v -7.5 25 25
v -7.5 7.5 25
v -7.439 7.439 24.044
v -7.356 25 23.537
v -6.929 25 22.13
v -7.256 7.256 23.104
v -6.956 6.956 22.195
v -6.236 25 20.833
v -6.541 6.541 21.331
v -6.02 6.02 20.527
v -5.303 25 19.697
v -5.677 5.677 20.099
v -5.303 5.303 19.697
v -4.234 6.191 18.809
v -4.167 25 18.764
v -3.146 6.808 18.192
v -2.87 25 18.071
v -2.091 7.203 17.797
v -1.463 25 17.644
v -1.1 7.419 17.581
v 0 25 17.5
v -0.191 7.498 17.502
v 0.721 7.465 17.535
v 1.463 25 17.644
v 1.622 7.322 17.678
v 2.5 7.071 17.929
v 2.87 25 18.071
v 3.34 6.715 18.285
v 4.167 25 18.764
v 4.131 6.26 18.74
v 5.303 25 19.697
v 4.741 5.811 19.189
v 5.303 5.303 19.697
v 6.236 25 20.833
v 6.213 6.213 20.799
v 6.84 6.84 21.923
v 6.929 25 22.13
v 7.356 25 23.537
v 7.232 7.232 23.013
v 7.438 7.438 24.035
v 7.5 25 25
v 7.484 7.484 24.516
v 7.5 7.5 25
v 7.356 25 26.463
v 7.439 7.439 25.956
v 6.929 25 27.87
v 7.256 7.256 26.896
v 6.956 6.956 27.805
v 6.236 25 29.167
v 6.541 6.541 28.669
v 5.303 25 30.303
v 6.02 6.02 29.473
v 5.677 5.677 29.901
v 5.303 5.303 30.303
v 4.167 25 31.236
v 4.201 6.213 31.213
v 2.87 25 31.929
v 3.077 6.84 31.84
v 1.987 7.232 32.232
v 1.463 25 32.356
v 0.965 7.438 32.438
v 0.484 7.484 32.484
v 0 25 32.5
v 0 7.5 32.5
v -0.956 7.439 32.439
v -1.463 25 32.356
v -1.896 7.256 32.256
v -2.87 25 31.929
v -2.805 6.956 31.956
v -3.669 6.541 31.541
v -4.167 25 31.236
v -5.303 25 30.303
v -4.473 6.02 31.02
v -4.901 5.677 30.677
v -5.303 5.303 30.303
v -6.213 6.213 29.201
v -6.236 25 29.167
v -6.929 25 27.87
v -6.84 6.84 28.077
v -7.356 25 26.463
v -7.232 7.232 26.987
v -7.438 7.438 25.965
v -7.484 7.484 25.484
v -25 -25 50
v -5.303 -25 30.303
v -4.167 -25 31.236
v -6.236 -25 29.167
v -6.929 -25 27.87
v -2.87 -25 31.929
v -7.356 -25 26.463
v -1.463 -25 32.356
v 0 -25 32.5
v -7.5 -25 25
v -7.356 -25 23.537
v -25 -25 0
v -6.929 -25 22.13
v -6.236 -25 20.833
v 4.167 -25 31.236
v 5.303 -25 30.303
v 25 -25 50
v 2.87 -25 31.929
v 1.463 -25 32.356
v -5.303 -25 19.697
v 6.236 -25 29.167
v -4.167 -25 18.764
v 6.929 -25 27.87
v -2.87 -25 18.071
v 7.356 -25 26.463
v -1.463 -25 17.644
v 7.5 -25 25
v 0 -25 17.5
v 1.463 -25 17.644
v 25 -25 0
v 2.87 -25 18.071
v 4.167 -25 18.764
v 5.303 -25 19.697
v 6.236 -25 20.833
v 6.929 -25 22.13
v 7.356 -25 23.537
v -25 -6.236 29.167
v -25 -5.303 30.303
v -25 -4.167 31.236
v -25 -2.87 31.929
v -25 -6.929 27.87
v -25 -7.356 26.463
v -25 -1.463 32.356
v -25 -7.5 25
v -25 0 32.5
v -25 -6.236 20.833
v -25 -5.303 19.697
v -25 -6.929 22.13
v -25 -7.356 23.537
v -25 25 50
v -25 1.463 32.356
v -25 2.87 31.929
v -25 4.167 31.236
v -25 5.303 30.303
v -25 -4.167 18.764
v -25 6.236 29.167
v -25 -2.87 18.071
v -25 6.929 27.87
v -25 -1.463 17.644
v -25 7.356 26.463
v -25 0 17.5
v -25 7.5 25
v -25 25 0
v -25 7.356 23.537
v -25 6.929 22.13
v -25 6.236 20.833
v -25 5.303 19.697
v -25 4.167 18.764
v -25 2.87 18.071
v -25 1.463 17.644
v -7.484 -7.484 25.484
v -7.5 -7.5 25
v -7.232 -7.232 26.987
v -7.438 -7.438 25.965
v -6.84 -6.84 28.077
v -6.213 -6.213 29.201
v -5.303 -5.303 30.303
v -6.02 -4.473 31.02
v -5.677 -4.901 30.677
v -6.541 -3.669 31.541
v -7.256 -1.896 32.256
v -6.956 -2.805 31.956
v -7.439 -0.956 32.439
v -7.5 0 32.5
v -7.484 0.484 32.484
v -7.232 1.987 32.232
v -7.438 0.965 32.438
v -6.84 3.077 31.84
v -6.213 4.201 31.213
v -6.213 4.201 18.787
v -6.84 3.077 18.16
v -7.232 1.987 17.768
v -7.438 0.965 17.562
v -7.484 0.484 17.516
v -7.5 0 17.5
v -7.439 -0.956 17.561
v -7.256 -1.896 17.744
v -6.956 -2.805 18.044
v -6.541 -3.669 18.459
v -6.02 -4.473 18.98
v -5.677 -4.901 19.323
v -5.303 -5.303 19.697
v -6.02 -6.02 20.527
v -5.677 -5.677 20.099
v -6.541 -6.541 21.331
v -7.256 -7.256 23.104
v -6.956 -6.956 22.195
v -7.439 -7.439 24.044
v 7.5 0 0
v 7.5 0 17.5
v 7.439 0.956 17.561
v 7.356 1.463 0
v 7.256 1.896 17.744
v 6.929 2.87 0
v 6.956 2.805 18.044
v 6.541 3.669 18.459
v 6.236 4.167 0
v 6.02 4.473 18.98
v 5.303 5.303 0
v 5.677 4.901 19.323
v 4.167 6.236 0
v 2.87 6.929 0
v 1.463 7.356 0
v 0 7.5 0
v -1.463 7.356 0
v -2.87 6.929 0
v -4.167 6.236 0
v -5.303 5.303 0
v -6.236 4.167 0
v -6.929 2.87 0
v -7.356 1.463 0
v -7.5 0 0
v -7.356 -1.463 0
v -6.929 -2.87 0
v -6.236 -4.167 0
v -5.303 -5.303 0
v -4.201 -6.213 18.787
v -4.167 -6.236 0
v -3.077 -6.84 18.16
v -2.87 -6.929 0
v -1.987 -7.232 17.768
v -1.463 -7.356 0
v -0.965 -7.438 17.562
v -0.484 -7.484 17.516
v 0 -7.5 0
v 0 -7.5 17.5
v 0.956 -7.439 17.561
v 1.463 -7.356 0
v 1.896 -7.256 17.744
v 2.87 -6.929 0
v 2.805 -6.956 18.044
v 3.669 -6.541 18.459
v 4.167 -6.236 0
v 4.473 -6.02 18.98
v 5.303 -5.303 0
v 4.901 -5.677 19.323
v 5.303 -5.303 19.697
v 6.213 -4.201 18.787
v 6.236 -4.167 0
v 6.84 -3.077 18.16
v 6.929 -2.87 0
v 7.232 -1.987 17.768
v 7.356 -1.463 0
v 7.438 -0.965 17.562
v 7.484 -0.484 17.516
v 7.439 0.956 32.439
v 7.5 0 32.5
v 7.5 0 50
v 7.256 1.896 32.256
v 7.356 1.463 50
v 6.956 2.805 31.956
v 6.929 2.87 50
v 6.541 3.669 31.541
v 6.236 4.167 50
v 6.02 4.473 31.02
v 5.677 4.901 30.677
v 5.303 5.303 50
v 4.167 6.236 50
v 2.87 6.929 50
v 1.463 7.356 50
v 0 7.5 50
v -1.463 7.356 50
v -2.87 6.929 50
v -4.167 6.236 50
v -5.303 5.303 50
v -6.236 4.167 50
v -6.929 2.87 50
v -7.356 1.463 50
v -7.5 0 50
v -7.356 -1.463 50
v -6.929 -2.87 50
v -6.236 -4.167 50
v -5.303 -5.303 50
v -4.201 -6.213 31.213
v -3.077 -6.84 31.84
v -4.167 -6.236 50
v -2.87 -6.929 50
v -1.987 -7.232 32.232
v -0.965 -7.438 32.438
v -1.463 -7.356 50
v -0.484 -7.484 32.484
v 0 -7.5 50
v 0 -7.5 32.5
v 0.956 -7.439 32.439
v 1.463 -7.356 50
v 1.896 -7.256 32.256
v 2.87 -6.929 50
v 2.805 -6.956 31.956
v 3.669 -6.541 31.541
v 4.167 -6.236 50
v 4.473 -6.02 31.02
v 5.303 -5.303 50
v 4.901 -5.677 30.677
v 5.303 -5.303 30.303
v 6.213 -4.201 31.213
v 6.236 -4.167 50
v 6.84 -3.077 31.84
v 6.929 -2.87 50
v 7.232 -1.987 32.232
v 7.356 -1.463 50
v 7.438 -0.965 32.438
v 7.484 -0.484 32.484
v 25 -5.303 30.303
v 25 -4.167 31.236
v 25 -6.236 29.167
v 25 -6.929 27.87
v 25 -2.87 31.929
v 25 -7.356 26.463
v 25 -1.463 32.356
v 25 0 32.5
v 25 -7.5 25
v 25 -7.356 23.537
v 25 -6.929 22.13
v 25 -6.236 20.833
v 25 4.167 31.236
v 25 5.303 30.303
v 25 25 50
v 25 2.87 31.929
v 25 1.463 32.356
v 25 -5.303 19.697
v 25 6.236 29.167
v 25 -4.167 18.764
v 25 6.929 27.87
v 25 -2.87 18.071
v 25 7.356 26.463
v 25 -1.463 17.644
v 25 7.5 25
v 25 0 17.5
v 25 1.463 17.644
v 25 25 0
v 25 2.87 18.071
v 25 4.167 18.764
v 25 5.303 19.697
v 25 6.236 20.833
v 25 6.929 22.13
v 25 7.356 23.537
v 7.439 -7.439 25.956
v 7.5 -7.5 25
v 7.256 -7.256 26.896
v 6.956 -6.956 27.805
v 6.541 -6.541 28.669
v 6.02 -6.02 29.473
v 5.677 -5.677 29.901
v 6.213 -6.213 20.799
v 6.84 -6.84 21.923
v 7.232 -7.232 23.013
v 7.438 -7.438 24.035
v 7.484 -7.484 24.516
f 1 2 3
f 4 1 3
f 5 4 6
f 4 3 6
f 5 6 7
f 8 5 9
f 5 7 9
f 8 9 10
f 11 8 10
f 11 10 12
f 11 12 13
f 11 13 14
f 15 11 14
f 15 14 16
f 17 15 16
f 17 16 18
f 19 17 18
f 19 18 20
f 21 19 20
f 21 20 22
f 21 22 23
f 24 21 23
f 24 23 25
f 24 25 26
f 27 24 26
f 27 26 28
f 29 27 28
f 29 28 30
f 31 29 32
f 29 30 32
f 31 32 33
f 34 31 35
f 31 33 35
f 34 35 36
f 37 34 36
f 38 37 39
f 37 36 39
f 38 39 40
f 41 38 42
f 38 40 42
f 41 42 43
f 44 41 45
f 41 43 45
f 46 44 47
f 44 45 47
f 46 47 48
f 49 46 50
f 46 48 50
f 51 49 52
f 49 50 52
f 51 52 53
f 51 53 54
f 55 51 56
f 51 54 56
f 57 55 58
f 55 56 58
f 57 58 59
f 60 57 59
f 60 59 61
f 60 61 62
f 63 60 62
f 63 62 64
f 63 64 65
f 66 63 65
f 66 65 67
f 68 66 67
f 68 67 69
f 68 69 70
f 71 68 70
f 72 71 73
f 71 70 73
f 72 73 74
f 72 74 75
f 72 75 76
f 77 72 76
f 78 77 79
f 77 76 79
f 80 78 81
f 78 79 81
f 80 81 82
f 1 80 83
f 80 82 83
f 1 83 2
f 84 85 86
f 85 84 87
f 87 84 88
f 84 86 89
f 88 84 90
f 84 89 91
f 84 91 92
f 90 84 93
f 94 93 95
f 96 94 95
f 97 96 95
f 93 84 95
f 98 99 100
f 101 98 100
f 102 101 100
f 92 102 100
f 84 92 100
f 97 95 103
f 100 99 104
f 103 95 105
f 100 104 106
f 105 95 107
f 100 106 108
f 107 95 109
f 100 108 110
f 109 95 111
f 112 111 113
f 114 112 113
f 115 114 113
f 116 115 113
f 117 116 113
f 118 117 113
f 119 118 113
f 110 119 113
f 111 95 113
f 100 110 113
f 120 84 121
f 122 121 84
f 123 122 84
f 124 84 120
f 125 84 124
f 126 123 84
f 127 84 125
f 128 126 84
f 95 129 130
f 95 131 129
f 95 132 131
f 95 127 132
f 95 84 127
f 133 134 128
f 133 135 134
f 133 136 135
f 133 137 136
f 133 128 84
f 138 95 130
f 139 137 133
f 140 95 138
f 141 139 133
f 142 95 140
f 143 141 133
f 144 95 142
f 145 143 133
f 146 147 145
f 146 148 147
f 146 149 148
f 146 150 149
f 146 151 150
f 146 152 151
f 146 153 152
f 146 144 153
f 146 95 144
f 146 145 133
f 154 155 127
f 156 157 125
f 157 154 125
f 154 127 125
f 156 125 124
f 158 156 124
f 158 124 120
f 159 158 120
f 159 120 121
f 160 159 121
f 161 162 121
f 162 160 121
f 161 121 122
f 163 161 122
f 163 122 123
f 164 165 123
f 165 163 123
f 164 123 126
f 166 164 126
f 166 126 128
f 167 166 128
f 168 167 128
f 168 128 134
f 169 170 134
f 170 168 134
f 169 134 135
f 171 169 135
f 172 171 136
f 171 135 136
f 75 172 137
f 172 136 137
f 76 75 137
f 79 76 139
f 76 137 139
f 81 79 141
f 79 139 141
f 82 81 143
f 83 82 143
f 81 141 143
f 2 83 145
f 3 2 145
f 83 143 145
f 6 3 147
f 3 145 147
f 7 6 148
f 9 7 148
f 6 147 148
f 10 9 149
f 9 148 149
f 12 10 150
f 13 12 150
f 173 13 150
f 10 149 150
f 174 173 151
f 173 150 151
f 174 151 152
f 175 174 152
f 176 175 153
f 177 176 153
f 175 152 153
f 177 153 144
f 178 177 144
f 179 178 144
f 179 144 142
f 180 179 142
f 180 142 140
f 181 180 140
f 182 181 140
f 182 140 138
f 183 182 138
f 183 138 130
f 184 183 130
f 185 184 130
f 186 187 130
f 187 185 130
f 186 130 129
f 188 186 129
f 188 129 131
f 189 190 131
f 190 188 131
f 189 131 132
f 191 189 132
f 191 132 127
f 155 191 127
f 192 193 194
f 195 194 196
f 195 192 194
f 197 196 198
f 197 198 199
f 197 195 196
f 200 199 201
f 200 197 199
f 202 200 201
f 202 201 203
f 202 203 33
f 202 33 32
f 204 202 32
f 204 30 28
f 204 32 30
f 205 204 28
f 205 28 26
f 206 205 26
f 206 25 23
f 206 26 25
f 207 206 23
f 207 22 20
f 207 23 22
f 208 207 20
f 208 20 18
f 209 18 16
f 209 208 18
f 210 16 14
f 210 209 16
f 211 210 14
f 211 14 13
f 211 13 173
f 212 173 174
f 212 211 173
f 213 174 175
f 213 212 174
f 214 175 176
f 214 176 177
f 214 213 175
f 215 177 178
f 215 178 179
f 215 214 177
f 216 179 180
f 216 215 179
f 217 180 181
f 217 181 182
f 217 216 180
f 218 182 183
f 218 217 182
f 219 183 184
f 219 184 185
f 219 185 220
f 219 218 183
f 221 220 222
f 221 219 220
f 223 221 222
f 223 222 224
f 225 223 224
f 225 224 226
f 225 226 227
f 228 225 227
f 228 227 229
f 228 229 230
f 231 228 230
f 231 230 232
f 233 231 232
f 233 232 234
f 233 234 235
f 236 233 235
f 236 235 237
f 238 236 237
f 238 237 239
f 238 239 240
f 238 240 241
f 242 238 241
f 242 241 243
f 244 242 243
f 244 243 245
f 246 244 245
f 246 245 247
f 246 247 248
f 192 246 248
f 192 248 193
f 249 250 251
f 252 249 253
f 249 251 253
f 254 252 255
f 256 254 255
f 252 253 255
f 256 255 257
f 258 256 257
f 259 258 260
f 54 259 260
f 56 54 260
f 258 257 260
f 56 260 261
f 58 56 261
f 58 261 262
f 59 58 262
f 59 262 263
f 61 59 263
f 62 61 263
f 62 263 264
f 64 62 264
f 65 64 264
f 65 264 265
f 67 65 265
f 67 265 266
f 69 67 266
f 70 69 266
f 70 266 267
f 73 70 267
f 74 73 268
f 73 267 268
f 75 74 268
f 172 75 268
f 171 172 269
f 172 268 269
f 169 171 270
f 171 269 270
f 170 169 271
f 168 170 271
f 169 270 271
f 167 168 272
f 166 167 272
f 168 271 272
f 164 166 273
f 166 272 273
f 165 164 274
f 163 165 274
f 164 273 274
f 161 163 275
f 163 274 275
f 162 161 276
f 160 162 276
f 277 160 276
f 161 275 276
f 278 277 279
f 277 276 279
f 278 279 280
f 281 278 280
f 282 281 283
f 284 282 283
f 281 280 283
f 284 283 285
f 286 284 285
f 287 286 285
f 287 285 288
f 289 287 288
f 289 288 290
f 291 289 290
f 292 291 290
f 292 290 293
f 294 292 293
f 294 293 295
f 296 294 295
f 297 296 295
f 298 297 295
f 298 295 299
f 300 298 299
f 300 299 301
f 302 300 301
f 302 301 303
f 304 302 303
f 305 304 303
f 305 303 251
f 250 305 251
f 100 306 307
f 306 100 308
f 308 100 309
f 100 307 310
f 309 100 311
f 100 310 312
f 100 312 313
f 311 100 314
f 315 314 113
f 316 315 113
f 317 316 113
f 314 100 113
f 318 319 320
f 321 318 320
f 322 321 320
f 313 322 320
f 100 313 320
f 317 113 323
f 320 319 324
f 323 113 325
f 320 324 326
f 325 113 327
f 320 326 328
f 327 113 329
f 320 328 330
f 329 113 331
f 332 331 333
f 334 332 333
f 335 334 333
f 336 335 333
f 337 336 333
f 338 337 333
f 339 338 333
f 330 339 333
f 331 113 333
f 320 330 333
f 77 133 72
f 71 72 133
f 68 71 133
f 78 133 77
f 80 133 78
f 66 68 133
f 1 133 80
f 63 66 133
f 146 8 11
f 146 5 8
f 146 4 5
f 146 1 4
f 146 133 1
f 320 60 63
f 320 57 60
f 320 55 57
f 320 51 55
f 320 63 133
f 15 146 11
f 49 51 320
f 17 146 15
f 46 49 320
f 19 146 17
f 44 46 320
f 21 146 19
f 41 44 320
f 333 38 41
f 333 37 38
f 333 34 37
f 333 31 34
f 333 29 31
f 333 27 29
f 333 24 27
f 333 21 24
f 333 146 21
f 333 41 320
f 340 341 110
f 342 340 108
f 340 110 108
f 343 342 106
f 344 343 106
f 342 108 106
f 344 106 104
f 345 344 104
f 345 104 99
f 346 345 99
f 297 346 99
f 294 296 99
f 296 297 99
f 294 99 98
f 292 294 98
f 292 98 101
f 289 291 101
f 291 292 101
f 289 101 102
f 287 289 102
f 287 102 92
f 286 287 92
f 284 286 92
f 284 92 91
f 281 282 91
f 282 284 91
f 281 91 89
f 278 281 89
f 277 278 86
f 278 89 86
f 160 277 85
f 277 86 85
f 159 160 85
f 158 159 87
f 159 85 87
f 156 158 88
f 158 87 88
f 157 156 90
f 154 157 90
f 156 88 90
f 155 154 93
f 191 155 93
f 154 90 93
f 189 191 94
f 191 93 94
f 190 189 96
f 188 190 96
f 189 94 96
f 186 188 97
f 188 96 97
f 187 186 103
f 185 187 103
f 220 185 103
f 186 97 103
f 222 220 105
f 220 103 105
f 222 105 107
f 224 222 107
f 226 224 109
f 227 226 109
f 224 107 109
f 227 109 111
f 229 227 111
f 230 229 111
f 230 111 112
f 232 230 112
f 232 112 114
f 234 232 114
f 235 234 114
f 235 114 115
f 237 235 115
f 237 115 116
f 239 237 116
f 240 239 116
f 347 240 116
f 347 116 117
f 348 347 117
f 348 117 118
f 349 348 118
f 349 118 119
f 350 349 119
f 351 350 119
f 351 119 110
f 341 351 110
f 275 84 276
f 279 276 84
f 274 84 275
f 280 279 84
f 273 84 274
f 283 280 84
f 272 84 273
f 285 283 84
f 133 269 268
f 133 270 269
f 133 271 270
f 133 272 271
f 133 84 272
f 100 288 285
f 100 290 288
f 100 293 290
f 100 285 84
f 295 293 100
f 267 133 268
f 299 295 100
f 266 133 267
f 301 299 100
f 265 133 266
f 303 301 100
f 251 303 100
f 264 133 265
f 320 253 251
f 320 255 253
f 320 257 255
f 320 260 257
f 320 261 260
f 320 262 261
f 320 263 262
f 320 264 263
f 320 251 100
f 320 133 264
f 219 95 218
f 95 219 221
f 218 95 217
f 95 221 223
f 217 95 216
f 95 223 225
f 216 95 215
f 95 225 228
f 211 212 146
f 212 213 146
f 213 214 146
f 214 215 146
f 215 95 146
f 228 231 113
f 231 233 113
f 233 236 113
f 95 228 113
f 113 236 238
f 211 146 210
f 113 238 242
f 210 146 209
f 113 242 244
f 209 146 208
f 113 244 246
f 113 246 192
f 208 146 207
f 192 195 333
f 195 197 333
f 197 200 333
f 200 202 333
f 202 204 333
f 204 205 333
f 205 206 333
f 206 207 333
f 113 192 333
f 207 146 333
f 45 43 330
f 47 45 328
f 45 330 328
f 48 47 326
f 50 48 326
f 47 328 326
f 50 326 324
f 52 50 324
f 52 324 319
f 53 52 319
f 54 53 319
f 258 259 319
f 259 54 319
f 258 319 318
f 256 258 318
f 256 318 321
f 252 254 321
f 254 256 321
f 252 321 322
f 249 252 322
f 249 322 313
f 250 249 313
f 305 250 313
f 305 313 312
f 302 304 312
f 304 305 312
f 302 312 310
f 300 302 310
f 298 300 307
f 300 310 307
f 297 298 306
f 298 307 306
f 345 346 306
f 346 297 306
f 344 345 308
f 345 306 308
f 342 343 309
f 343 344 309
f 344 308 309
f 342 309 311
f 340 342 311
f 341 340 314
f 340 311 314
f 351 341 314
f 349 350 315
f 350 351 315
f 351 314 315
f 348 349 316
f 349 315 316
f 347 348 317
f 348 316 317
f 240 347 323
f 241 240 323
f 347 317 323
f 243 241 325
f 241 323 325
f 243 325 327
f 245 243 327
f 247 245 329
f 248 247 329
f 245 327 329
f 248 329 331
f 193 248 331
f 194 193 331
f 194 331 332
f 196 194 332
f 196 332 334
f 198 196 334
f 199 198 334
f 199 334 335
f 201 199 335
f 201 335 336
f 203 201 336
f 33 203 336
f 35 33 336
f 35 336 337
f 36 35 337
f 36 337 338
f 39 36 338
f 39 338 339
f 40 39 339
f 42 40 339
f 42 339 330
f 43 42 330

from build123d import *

# Parameters (mm, degrees)
F0_W      = 50
F0_H      = 50
F1_DEPTH  = 50
F2_R      = 7.5
F8_DEPTH  = 25
F3_R      = 7.5
F9_DEPTH  = 25
F4_R      = 7.5
F10_DEPTH = 25
F5_R      = 7.5
F11_DEPTH = 25
F6_R      = 7.5
F12_DEPTH = 25
F7_R      = 7.5
F13_DEPTH = 25


with BuildPart() as f1:
    # F0 (on Top) → F1 (new body)
    with BuildSketch(Plane.XY):
        Rectangle(F0_W, F0_H)
    extrude(amount=F1_DEPTH)

    # F2 (on face) → F8 (cut)
    with BuildSketch(Plane.XY.offset(50)):
        Circle(F2_R)
    extrude(amount=-F8_DEPTH, mode=Mode.SUBTRACT)

    # F3 (on face) → F9 (cut)
    with BuildSketch(Plane(origin=(0, 25, 0), x_dir=(-1, 0, 0), z_dir=(0, 1, 0))):
        with Locations((0, 25)):
            Circle(F3_R)
    extrude(amount=-F9_DEPTH, mode=Mode.SUBTRACT)

    # F4 (on face) → F10 (cut)
    with BuildSketch(Plane.XZ.offset(25)):
        with Locations((0, 25)):
            Circle(F4_R)
    extrude(amount=-F10_DEPTH, mode=Mode.SUBTRACT)

    # F5 (on face) → F11 (cut)
    with BuildSketch(Plane(origin=(-25, 0, 0), x_dir=(0, -1, 0), z_dir=(-1, 0, 0))):
        with Locations((0, 25)):
            Circle(F5_R)
    extrude(amount=-F11_DEPTH, mode=Mode.SUBTRACT)

    # F6 (on face) → F12 (cut)
    with BuildSketch(Plane.YZ.offset(25)):
        with Locations((0, 25)):
            Circle(F6_R)
    extrude(amount=-F12_DEPTH, mode=Mode.SUBTRACT)

    # F7 (on face) → F13 (cut)
    with BuildSketch(Plane.XY):
        Circle(F7_R)
    extrude(amount=F13_DEPTH, mode=Mode.SUBTRACT)


solid = f1.part
